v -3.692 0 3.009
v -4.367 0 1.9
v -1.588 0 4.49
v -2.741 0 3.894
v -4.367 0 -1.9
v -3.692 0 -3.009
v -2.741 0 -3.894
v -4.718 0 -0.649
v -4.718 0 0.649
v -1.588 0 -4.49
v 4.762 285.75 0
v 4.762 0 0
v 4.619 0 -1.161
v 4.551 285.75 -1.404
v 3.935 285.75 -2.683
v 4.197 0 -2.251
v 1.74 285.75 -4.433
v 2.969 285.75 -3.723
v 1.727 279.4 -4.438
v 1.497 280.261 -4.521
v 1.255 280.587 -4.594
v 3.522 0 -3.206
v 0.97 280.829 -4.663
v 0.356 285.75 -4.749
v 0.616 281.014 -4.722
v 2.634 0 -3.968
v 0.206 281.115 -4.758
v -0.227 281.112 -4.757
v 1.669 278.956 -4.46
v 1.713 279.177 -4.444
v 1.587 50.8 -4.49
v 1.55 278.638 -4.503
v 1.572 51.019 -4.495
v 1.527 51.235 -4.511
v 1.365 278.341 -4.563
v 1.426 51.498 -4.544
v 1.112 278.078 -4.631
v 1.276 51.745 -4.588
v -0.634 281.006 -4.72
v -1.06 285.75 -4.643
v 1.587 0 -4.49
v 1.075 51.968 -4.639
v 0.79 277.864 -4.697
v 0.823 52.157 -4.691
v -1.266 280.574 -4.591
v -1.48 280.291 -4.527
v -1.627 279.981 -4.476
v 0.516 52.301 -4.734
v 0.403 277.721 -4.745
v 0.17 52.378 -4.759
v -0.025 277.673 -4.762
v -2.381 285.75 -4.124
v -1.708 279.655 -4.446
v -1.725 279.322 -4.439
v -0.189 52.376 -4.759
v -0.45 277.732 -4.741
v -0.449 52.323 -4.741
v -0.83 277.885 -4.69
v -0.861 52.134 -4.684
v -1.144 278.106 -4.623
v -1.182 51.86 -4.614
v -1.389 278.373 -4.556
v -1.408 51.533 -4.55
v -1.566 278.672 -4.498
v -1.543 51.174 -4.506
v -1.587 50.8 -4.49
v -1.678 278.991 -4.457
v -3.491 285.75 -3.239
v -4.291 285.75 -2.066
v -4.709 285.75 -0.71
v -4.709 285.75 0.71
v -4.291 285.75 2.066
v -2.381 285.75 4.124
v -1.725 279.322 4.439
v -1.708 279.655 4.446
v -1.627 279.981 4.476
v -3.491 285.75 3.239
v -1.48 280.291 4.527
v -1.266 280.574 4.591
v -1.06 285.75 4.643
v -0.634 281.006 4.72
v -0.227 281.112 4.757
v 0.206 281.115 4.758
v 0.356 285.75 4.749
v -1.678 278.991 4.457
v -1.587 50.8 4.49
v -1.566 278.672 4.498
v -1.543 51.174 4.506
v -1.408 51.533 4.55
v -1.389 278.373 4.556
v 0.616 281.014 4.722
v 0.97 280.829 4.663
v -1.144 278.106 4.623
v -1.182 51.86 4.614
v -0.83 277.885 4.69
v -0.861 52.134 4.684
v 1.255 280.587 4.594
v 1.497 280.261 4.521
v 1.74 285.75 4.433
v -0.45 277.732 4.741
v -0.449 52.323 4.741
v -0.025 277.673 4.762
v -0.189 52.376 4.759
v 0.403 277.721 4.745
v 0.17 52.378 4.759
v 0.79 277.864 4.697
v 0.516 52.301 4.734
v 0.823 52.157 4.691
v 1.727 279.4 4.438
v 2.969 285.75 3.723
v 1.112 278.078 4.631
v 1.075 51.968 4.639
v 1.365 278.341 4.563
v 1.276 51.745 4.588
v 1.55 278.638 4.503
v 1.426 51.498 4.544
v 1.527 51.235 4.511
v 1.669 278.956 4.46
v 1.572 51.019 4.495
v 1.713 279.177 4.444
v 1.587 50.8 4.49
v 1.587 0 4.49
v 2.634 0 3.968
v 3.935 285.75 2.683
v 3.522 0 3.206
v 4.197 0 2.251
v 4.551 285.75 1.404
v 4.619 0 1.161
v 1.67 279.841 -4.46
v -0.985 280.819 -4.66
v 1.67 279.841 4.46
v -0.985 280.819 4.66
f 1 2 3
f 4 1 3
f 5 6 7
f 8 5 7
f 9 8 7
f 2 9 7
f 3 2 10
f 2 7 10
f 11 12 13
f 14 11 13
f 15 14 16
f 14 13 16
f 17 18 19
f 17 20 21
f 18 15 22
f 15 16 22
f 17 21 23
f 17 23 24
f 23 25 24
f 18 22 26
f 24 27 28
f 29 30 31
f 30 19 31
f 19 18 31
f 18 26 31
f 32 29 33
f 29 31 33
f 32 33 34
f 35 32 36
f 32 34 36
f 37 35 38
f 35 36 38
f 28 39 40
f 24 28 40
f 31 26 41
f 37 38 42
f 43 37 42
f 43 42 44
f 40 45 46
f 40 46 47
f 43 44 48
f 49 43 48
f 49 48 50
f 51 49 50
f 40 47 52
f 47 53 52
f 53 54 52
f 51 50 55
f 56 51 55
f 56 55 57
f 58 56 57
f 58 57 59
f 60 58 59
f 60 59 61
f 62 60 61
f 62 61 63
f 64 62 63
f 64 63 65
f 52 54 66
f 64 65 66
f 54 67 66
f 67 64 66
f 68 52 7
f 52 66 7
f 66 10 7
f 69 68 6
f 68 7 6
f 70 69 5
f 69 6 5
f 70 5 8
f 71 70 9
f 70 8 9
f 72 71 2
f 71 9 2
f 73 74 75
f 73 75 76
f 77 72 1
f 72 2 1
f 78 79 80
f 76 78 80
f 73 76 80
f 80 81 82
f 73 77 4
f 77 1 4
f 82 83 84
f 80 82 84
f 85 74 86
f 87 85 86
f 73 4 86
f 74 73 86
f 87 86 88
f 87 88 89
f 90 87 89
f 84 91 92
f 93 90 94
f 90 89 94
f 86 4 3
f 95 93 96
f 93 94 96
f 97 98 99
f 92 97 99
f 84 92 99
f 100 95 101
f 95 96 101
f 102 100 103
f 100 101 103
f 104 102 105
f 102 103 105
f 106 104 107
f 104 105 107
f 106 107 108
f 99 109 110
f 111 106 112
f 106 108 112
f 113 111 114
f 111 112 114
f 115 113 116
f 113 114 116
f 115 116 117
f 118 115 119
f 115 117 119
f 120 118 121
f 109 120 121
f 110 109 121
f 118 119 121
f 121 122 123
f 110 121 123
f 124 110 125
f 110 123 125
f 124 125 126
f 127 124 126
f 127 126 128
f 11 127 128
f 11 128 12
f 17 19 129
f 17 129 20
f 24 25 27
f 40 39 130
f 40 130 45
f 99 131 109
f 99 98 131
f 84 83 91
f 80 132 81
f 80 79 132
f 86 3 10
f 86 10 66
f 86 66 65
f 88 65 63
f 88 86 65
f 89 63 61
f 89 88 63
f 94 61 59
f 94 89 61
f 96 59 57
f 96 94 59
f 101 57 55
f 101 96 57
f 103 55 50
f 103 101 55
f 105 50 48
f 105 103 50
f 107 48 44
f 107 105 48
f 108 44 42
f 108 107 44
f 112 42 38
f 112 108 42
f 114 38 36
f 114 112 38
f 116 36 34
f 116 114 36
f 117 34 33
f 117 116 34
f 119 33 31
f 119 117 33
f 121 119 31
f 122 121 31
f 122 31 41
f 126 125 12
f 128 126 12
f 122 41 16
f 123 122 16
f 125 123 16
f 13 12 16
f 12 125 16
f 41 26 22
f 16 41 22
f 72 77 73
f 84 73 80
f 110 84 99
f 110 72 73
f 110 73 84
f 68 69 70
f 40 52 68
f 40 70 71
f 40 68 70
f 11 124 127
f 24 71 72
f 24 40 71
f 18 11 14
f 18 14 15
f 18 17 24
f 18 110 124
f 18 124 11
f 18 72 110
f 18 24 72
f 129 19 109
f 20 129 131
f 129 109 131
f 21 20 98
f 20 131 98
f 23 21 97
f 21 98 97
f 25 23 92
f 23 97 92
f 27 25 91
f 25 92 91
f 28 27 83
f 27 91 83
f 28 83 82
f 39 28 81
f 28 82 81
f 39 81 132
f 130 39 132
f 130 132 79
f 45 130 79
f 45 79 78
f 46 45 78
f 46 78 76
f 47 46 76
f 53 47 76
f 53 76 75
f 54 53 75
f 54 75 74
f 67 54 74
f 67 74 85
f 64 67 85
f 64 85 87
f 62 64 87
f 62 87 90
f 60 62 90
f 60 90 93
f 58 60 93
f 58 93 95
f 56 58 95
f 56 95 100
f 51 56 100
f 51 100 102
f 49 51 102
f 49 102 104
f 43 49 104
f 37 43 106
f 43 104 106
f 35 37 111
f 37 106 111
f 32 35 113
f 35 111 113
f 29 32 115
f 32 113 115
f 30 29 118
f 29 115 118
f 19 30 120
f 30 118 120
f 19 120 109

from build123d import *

# Parameters (mm, degrees)
SKETCH1_R               = 4.7625
BOSS_EXTRUDE1_DEPTH     = 285.75
CUT_EXTRUDE1_DEPTH      = 5.7625
CUT_EXTRUDE1_DEPTH_BACK = 5.7625
F_8_32_TAPPED_HOLE1_D   = 3.4544


with BuildPart() as part:
    # Sketch1 → Boss-Extrude1 (new body)
    with BuildSketch(Plane(origin=(0, 0, 0), x_dir=(1, 0, 0), z_dir=(0, 1, 0))):
        Circle(SKETCH1_R)
    extrude(amount=BOSS_EXTRUDE1_DEPTH)

    # Sketch2 → Cut-Extrude1 (cut, two sides)
    with BuildSketch(Plane.XY) as cut_extrude1_sk:
        with BuildLine():
            Line((-1.5875, -50.8), (-1.5875, 50.8))
            ThreePointArc((-1.5875, 50.8), (0, 52.3875), (1.5875, 50.8))
            Line((1.5875, 50.8), (1.5875, -50.8))
            ThreePointArc((1.5875, -50.8), (0, -52.3875), (-1.5875, -50.8))
        make_face()
    extrude(amount=CUT_EXTRUDE1_DEPTH, mode=Mode.SUBTRACT)
    extrude(cut_extrude1_sk.sketch, amount=-CUT_EXTRUDE1_DEPTH_BACK, mode=Mode.SUBTRACT)

    # #8-32 Tapped Hole1 (through all)
    with Locations(Plane(origin=(0, 0, -4.7625), x_dir=(-1, 0, 0), z_dir=(0, 0, -1))):
        with Locations((0, 279.4)):
            Hole(F_8_32_TAPPED_HOLE1_D / 2)


solid = part.part
